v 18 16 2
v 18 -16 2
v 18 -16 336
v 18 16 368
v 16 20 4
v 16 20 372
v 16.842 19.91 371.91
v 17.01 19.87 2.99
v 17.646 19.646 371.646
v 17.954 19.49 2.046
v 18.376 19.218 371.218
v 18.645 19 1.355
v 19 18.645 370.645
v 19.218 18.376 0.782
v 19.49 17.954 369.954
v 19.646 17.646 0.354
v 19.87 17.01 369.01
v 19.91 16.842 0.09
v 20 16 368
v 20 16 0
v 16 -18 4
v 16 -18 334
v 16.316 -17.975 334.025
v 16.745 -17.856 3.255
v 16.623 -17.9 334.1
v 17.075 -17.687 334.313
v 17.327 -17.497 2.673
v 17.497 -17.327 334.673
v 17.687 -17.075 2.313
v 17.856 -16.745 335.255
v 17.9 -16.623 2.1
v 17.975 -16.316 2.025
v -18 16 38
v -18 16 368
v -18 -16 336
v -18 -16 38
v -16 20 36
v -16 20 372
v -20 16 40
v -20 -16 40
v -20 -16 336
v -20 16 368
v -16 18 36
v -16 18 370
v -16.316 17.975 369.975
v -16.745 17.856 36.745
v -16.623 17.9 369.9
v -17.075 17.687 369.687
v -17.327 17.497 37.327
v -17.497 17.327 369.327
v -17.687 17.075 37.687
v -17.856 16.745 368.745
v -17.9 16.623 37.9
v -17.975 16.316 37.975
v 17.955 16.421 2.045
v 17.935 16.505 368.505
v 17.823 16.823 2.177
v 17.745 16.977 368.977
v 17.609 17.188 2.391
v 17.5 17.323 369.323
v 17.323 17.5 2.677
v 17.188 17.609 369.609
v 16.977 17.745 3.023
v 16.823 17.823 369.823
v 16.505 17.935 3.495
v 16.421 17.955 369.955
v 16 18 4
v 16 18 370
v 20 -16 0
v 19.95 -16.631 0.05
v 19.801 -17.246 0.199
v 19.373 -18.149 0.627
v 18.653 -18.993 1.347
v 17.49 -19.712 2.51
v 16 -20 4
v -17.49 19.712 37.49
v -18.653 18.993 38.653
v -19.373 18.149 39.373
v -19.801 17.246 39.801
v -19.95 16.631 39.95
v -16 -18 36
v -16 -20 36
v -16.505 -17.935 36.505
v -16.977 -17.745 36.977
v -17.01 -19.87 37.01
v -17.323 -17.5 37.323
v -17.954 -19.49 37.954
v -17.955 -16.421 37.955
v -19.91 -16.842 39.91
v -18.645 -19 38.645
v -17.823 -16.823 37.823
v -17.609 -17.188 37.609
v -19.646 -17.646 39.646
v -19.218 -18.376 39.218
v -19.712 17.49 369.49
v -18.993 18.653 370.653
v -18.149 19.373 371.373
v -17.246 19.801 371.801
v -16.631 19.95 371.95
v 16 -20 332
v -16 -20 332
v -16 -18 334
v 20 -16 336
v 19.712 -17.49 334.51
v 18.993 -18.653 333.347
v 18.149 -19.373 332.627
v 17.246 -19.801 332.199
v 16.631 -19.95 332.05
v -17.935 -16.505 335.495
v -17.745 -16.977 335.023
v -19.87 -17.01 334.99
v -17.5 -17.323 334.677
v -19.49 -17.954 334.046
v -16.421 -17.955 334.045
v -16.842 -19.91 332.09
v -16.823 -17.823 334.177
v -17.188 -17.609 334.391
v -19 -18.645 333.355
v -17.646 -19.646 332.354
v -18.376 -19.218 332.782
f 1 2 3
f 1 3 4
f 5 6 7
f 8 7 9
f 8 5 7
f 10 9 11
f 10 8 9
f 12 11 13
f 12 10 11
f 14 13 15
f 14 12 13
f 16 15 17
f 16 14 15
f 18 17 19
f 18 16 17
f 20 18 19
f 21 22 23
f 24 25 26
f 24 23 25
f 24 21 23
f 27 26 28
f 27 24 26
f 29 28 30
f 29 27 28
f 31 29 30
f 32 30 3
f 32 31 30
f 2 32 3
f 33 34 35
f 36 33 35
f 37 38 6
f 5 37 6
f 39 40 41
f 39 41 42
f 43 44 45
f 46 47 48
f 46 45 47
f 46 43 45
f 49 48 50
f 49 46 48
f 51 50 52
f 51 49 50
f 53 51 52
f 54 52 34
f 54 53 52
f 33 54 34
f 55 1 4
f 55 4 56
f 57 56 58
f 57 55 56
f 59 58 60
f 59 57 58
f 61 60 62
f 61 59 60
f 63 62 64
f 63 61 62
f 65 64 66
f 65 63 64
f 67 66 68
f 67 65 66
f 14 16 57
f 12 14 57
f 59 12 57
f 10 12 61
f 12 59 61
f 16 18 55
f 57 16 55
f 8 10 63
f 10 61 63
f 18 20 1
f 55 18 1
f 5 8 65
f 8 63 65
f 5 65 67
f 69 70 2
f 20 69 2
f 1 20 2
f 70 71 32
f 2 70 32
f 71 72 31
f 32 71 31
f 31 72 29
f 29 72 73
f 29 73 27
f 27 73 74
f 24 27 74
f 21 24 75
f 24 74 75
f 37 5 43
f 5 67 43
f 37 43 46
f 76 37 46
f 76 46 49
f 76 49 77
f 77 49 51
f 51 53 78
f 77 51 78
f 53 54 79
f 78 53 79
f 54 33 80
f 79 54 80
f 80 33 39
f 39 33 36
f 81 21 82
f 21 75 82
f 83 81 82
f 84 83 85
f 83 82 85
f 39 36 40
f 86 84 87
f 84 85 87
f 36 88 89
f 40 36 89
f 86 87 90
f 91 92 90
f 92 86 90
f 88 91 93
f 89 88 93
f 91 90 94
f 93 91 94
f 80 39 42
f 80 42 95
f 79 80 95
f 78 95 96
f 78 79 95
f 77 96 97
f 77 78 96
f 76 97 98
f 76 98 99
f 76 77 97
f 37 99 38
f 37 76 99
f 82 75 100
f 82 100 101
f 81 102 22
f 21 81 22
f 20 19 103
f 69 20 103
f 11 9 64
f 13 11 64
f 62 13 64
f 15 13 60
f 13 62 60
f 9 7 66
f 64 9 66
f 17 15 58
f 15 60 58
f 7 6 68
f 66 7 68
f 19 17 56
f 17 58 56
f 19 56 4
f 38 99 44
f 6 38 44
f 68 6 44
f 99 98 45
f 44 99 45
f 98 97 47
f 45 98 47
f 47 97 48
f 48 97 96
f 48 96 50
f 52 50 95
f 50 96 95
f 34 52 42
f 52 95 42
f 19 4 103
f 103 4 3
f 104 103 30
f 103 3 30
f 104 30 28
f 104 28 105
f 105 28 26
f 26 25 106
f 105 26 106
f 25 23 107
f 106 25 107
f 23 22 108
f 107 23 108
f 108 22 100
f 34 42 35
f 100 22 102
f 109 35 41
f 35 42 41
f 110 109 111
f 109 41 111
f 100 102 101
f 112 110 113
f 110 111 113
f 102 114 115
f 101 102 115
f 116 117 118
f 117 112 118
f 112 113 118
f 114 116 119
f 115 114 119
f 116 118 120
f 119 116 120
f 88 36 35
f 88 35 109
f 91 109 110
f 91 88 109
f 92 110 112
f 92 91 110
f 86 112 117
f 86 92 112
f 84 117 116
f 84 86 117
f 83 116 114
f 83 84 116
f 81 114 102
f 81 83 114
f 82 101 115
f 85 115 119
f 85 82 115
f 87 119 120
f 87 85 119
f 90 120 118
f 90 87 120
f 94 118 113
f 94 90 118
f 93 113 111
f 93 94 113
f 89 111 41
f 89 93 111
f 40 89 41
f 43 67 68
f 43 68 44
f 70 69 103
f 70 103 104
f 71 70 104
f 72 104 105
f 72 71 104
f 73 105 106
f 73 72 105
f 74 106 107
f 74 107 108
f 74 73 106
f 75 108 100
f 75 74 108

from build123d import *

# Parameters (mm, degrees)
Y_KSEKLIK_EKSTR_ZYON1_DEPTH = 372
KES_EKSTR_ZYON1_DEPTH       = 41
KES_EKSTR_ZYON1_DEPTH_BACK  = 43
KES_EKSTR_ZYON2_DEPTH       = 72
KES_EKSTR_ZYON2_DEPTH_BACK  = 61


with BuildPart() as part:
    # Çizim1 → Yükseklik-Ekstrüzyon1 (new body)
    with BuildSketch(Plane.XY):
        with BuildLine():
            Line((-16, 20), (16, 20))
            ThreePointArc((16, 20), (18.828427125, 18.828427125), (20, 16))
            Line((20, 16), (20, -16))
            ThreePointArc((20, -16), (18.828427125, -18.828427125), (16, -20))
            Line((16, -20), (-16, -20))
            ThreePointArc((-16, -20), (-18.828427125, -18.828427125), (-20, -16))
            Line((-20, -16), (-20, 16))
            ThreePointArc((-20, 16), (-18.828427125, 18.828427125), (-16, 20))
        make_face()
        with BuildLine():
            Line((-18, 16), (-18, -16))
            ThreePointArc((-18, -16), (-17.414213562, -17.414213562), (-16, -18))
            Line((-16, -18), (16, -18))
            ThreePointArc((16, -18), (17.414213562, -17.414213562), (18, -16))
            Line((18, -16), (18, 16))
            ThreePointArc((18, 16), (17.414213562, 17.414213562), (16, 18))
            Line((16, 18), (-16, 18))
            ThreePointArc((-16, 18), (-17.414213562, 17.414213562), (-18, 16))
        make_face(mode=Mode.SUBTRACT)
    extrude(amount=Y_KSEKLIK_EKSTR_ZYON1_DEPTH)

    # Çizim3 → Kes-Ekstrüzyon1 (cut, two sides: drawn at the far end of the back side and taken through both)
    with BuildSketch(Plane(origin=(0, 0, 0), x_dir=(0, 0, -1), z_dir=(1, 0, 0)).offset(-KES_EKSTR_ZYON1_DEPTH_BACK)):
        Polygon((-372, 20), (-332, -20), (-372, -20), align=None)
    extrude(amount=KES_EKSTR_ZYON1_DEPTH + KES_EKSTR_ZYON1_DEPTH_BACK, mode=Mode.SUBTRACT)

    # Çizim5 → Kes-Ekstrüzyon2 (cut, two sides: drawn at the far end of the back side and taken through both)
    with BuildSketch(Plane(origin=(0, 0, 0), x_dir=(1, 0, 0), z_dir=(0, 1, 0)).offset(-KES_EKSTR_ZYON2_DEPTH_BACK)):
        Polygon((20, 0), (-20, -40), (-20, 0), align=None)
    extrude(amount=KES_EKSTR_ZYON2_DEPTH + KES_EKSTR_ZYON2_DEPTH_BACK, mode=Mode.SUBTRACT)


solid = part.part
